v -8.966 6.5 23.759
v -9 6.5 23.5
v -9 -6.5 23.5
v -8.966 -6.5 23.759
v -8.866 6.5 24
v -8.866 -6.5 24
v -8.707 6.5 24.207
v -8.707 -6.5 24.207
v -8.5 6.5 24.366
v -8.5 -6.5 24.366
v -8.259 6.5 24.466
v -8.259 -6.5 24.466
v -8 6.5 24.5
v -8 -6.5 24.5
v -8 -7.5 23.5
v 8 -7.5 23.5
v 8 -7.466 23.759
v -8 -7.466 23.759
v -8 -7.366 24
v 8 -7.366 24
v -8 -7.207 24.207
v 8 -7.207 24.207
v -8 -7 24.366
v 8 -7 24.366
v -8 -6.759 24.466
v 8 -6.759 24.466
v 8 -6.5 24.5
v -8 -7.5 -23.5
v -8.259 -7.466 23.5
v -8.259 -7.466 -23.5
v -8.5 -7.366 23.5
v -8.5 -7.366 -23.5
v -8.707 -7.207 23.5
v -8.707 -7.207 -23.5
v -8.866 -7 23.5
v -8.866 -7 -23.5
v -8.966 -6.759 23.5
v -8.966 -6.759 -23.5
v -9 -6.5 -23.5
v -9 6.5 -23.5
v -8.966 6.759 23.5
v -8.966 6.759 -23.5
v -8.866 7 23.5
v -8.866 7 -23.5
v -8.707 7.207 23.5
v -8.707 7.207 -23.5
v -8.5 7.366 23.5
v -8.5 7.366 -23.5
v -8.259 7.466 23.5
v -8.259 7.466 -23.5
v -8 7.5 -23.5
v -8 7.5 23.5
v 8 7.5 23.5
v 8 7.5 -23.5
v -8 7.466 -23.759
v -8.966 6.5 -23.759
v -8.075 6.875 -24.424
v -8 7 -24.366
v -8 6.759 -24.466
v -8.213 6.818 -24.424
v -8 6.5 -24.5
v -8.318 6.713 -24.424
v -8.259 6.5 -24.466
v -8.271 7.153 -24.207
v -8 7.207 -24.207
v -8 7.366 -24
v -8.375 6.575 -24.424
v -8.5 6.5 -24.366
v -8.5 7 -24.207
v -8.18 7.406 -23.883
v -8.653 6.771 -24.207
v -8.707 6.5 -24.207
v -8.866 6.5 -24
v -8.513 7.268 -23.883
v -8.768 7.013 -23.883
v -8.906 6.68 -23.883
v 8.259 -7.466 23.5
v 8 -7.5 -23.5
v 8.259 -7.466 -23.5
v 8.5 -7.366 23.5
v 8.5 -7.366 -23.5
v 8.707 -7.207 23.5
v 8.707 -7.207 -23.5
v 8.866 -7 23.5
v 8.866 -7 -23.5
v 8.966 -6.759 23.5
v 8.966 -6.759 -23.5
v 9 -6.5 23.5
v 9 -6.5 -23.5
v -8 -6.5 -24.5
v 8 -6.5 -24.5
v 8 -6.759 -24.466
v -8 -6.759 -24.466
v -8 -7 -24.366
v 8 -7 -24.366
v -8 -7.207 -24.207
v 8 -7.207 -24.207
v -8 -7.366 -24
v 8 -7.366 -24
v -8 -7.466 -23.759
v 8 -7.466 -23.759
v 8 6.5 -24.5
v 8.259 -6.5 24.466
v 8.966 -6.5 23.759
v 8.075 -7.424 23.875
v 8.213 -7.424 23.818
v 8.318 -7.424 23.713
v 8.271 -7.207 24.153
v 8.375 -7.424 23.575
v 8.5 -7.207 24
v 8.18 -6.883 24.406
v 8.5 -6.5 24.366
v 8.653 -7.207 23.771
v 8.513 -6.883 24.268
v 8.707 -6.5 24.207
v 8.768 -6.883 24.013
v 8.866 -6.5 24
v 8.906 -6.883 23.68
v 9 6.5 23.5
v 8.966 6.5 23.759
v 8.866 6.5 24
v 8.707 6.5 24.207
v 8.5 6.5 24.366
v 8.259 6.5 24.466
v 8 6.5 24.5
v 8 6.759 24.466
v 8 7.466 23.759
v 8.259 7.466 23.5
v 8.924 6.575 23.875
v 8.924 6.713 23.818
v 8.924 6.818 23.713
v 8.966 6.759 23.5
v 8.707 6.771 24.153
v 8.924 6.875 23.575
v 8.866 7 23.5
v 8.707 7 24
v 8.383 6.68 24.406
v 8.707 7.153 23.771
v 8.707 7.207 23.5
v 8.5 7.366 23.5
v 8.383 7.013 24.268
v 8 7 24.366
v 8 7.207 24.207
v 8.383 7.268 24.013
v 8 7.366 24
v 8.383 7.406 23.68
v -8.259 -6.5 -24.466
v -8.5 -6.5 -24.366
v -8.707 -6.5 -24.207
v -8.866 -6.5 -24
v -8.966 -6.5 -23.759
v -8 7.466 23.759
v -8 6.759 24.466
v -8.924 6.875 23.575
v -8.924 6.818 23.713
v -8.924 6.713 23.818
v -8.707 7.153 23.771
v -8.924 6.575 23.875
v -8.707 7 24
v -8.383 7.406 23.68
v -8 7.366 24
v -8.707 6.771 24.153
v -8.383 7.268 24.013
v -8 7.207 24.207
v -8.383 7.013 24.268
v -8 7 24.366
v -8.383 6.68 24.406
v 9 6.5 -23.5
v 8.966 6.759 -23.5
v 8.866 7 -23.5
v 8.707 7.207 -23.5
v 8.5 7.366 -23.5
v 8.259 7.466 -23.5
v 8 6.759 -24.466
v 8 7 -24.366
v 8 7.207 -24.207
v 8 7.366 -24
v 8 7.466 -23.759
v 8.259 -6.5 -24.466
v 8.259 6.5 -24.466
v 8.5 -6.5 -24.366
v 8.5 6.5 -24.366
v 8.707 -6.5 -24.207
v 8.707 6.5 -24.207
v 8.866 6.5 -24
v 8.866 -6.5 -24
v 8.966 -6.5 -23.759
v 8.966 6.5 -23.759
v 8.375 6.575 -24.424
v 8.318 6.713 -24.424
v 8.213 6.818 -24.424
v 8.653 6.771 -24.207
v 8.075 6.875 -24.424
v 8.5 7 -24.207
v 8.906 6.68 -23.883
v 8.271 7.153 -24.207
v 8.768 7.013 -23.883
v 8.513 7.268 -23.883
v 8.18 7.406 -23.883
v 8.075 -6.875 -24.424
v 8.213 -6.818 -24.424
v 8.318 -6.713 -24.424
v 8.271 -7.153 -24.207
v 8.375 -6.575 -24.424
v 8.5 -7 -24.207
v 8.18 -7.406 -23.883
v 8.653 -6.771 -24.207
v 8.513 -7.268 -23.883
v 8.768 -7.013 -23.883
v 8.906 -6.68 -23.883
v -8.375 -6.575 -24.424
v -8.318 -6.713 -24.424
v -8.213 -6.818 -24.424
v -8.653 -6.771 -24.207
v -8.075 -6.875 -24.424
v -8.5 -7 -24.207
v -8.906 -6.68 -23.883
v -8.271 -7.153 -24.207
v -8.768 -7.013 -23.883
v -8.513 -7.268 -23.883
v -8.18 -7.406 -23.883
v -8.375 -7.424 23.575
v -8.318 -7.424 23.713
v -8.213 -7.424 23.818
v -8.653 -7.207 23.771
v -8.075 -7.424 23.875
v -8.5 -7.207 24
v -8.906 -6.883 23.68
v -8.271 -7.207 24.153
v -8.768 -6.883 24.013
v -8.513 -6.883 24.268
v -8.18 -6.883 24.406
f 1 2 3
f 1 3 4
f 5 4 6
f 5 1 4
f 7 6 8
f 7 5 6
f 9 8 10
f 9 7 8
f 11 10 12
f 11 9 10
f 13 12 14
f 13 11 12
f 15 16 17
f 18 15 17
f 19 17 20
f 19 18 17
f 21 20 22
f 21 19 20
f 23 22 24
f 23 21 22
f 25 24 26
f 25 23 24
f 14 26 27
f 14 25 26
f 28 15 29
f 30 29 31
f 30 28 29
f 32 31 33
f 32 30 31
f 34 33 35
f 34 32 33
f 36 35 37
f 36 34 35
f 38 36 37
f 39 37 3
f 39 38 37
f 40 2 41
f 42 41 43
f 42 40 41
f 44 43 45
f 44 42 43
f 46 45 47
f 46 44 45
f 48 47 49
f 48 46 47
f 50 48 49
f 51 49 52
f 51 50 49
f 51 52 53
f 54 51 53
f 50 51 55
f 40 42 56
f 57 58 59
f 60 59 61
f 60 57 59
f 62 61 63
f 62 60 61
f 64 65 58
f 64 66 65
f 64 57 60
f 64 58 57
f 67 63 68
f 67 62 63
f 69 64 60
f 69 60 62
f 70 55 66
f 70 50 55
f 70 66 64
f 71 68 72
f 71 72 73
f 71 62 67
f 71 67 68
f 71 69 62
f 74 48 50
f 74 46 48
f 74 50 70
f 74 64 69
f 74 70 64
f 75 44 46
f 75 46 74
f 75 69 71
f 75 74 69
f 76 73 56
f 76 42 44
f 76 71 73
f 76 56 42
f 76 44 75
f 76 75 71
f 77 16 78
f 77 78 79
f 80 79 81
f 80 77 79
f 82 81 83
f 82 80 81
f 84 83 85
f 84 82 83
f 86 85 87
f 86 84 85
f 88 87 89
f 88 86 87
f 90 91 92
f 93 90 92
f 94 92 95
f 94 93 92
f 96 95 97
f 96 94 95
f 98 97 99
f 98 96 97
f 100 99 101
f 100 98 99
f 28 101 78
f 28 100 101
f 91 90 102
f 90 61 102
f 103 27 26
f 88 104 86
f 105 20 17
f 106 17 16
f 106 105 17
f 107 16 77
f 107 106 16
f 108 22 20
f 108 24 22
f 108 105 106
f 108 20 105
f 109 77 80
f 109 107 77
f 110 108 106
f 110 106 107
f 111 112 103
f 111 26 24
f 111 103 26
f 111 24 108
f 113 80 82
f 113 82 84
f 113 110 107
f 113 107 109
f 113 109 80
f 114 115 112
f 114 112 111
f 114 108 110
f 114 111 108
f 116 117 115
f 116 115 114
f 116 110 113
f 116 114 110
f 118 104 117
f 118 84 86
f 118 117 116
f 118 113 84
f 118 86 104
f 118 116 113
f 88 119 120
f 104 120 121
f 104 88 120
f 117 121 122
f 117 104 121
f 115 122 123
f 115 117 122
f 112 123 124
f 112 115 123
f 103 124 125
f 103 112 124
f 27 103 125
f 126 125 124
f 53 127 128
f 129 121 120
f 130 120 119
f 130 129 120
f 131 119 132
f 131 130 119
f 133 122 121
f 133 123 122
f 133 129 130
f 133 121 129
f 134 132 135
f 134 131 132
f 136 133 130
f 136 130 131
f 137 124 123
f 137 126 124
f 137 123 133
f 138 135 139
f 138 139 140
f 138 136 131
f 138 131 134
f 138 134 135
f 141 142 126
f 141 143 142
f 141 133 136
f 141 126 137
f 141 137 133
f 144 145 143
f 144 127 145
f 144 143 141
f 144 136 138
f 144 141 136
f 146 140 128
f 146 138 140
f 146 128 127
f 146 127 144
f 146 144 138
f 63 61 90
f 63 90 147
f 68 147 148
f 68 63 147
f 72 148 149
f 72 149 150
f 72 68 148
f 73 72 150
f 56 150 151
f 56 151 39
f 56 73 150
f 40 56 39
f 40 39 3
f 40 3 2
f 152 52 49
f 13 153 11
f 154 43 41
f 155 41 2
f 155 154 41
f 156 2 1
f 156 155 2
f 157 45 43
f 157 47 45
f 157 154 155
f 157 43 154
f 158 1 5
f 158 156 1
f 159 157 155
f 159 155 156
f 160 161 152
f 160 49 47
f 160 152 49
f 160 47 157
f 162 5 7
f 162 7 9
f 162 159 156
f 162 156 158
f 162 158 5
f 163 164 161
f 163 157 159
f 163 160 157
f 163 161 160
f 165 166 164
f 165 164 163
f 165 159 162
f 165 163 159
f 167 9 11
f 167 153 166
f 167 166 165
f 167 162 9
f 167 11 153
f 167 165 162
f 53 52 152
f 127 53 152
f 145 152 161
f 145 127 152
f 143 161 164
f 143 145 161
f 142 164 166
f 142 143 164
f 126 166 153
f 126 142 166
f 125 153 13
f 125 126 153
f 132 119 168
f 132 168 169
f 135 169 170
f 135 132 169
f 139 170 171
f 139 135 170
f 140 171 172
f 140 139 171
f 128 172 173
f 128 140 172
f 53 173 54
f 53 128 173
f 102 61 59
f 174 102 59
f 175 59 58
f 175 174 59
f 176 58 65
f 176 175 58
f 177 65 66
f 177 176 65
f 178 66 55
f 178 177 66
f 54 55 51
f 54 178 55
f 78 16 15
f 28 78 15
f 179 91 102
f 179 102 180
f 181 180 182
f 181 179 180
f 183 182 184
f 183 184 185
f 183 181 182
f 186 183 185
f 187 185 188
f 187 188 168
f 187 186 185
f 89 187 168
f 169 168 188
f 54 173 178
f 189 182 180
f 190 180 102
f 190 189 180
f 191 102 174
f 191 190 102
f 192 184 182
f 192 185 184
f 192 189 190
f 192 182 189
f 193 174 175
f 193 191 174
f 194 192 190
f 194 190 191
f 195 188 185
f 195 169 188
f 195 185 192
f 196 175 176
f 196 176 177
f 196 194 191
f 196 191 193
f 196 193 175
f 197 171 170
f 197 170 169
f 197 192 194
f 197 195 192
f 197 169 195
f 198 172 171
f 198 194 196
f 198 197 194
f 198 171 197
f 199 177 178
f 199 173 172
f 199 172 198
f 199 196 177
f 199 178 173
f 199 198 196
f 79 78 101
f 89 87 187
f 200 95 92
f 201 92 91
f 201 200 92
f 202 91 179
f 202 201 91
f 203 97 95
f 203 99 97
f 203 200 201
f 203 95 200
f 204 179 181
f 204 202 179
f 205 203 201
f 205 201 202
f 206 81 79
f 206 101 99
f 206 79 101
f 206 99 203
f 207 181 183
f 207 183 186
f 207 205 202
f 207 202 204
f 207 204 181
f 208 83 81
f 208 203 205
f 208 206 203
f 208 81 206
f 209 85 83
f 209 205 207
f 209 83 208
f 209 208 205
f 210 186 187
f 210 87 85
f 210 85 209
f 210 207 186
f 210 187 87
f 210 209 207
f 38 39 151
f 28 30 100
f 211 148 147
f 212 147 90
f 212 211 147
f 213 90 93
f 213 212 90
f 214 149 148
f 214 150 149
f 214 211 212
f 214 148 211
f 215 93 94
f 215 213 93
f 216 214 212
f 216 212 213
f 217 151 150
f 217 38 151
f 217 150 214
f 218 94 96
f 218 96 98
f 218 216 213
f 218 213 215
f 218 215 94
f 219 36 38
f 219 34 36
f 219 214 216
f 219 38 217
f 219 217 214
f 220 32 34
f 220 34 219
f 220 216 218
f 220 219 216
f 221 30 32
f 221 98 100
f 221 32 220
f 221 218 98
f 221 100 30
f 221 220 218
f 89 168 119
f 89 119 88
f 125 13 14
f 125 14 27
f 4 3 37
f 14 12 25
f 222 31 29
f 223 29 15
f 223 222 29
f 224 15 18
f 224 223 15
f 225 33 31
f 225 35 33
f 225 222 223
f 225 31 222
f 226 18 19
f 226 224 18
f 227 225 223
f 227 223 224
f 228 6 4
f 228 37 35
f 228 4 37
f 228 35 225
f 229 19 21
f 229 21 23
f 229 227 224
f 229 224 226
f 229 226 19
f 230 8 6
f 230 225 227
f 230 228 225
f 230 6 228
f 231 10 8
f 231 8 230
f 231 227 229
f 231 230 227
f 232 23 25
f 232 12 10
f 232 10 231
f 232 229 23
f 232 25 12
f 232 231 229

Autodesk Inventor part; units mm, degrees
ref_plane "YZ Plane" through (0, 0, 0) normal (1, 0, 0) x (0, 1, 0)
ref_plane "XZ Plane" through (0, 0, 0) normal (0, 1, 0) x (-1, 0, 0)
ref_plane "XY Plane" through (0, 0, 0) normal (0, 0, 1) x (1, 0, 0)
sketch "Sketch1" plane through (0, 0, 0) normal (0, 0, 1) x (1, 0, 0)
  line L0 (9, -7.5) -> (-9, -7.5)
  line L1 (-9, -7.5) -> (-9, 7.5)
  line L2 (-9, 7.5) -> (9, 7.5)
  line L3 (9, 7.5) -> (9, -7.5)
  line L4 (9, -7.5) -> (-9, 7.5) construction
  line L5 (-9, -7.5) -> (9, 7.5) construction
  point P0 (0, 0)
  dimension "d0" = 18
  dimension "d1" = 15
extrude "Extrusion1" add sketch "Sketch1" along normal mid plane 49
fillet "Fillet1" radius 1 12 edges at (0, 7.5, 24.5) (9, 0, 24.5) (-9, 0, 24.5) (0, -7.5, 24.5) (9, -7.5, 0) (9, 7.5, 0) (-9, 7.5, 0) (-9, -7.5, 0) (0, 7.5, -24.5) (9, 0, -24.5) (-9, 0, -24.5) (0, -7.5, -24.5)
properties part number "850mah" material "Battery"
